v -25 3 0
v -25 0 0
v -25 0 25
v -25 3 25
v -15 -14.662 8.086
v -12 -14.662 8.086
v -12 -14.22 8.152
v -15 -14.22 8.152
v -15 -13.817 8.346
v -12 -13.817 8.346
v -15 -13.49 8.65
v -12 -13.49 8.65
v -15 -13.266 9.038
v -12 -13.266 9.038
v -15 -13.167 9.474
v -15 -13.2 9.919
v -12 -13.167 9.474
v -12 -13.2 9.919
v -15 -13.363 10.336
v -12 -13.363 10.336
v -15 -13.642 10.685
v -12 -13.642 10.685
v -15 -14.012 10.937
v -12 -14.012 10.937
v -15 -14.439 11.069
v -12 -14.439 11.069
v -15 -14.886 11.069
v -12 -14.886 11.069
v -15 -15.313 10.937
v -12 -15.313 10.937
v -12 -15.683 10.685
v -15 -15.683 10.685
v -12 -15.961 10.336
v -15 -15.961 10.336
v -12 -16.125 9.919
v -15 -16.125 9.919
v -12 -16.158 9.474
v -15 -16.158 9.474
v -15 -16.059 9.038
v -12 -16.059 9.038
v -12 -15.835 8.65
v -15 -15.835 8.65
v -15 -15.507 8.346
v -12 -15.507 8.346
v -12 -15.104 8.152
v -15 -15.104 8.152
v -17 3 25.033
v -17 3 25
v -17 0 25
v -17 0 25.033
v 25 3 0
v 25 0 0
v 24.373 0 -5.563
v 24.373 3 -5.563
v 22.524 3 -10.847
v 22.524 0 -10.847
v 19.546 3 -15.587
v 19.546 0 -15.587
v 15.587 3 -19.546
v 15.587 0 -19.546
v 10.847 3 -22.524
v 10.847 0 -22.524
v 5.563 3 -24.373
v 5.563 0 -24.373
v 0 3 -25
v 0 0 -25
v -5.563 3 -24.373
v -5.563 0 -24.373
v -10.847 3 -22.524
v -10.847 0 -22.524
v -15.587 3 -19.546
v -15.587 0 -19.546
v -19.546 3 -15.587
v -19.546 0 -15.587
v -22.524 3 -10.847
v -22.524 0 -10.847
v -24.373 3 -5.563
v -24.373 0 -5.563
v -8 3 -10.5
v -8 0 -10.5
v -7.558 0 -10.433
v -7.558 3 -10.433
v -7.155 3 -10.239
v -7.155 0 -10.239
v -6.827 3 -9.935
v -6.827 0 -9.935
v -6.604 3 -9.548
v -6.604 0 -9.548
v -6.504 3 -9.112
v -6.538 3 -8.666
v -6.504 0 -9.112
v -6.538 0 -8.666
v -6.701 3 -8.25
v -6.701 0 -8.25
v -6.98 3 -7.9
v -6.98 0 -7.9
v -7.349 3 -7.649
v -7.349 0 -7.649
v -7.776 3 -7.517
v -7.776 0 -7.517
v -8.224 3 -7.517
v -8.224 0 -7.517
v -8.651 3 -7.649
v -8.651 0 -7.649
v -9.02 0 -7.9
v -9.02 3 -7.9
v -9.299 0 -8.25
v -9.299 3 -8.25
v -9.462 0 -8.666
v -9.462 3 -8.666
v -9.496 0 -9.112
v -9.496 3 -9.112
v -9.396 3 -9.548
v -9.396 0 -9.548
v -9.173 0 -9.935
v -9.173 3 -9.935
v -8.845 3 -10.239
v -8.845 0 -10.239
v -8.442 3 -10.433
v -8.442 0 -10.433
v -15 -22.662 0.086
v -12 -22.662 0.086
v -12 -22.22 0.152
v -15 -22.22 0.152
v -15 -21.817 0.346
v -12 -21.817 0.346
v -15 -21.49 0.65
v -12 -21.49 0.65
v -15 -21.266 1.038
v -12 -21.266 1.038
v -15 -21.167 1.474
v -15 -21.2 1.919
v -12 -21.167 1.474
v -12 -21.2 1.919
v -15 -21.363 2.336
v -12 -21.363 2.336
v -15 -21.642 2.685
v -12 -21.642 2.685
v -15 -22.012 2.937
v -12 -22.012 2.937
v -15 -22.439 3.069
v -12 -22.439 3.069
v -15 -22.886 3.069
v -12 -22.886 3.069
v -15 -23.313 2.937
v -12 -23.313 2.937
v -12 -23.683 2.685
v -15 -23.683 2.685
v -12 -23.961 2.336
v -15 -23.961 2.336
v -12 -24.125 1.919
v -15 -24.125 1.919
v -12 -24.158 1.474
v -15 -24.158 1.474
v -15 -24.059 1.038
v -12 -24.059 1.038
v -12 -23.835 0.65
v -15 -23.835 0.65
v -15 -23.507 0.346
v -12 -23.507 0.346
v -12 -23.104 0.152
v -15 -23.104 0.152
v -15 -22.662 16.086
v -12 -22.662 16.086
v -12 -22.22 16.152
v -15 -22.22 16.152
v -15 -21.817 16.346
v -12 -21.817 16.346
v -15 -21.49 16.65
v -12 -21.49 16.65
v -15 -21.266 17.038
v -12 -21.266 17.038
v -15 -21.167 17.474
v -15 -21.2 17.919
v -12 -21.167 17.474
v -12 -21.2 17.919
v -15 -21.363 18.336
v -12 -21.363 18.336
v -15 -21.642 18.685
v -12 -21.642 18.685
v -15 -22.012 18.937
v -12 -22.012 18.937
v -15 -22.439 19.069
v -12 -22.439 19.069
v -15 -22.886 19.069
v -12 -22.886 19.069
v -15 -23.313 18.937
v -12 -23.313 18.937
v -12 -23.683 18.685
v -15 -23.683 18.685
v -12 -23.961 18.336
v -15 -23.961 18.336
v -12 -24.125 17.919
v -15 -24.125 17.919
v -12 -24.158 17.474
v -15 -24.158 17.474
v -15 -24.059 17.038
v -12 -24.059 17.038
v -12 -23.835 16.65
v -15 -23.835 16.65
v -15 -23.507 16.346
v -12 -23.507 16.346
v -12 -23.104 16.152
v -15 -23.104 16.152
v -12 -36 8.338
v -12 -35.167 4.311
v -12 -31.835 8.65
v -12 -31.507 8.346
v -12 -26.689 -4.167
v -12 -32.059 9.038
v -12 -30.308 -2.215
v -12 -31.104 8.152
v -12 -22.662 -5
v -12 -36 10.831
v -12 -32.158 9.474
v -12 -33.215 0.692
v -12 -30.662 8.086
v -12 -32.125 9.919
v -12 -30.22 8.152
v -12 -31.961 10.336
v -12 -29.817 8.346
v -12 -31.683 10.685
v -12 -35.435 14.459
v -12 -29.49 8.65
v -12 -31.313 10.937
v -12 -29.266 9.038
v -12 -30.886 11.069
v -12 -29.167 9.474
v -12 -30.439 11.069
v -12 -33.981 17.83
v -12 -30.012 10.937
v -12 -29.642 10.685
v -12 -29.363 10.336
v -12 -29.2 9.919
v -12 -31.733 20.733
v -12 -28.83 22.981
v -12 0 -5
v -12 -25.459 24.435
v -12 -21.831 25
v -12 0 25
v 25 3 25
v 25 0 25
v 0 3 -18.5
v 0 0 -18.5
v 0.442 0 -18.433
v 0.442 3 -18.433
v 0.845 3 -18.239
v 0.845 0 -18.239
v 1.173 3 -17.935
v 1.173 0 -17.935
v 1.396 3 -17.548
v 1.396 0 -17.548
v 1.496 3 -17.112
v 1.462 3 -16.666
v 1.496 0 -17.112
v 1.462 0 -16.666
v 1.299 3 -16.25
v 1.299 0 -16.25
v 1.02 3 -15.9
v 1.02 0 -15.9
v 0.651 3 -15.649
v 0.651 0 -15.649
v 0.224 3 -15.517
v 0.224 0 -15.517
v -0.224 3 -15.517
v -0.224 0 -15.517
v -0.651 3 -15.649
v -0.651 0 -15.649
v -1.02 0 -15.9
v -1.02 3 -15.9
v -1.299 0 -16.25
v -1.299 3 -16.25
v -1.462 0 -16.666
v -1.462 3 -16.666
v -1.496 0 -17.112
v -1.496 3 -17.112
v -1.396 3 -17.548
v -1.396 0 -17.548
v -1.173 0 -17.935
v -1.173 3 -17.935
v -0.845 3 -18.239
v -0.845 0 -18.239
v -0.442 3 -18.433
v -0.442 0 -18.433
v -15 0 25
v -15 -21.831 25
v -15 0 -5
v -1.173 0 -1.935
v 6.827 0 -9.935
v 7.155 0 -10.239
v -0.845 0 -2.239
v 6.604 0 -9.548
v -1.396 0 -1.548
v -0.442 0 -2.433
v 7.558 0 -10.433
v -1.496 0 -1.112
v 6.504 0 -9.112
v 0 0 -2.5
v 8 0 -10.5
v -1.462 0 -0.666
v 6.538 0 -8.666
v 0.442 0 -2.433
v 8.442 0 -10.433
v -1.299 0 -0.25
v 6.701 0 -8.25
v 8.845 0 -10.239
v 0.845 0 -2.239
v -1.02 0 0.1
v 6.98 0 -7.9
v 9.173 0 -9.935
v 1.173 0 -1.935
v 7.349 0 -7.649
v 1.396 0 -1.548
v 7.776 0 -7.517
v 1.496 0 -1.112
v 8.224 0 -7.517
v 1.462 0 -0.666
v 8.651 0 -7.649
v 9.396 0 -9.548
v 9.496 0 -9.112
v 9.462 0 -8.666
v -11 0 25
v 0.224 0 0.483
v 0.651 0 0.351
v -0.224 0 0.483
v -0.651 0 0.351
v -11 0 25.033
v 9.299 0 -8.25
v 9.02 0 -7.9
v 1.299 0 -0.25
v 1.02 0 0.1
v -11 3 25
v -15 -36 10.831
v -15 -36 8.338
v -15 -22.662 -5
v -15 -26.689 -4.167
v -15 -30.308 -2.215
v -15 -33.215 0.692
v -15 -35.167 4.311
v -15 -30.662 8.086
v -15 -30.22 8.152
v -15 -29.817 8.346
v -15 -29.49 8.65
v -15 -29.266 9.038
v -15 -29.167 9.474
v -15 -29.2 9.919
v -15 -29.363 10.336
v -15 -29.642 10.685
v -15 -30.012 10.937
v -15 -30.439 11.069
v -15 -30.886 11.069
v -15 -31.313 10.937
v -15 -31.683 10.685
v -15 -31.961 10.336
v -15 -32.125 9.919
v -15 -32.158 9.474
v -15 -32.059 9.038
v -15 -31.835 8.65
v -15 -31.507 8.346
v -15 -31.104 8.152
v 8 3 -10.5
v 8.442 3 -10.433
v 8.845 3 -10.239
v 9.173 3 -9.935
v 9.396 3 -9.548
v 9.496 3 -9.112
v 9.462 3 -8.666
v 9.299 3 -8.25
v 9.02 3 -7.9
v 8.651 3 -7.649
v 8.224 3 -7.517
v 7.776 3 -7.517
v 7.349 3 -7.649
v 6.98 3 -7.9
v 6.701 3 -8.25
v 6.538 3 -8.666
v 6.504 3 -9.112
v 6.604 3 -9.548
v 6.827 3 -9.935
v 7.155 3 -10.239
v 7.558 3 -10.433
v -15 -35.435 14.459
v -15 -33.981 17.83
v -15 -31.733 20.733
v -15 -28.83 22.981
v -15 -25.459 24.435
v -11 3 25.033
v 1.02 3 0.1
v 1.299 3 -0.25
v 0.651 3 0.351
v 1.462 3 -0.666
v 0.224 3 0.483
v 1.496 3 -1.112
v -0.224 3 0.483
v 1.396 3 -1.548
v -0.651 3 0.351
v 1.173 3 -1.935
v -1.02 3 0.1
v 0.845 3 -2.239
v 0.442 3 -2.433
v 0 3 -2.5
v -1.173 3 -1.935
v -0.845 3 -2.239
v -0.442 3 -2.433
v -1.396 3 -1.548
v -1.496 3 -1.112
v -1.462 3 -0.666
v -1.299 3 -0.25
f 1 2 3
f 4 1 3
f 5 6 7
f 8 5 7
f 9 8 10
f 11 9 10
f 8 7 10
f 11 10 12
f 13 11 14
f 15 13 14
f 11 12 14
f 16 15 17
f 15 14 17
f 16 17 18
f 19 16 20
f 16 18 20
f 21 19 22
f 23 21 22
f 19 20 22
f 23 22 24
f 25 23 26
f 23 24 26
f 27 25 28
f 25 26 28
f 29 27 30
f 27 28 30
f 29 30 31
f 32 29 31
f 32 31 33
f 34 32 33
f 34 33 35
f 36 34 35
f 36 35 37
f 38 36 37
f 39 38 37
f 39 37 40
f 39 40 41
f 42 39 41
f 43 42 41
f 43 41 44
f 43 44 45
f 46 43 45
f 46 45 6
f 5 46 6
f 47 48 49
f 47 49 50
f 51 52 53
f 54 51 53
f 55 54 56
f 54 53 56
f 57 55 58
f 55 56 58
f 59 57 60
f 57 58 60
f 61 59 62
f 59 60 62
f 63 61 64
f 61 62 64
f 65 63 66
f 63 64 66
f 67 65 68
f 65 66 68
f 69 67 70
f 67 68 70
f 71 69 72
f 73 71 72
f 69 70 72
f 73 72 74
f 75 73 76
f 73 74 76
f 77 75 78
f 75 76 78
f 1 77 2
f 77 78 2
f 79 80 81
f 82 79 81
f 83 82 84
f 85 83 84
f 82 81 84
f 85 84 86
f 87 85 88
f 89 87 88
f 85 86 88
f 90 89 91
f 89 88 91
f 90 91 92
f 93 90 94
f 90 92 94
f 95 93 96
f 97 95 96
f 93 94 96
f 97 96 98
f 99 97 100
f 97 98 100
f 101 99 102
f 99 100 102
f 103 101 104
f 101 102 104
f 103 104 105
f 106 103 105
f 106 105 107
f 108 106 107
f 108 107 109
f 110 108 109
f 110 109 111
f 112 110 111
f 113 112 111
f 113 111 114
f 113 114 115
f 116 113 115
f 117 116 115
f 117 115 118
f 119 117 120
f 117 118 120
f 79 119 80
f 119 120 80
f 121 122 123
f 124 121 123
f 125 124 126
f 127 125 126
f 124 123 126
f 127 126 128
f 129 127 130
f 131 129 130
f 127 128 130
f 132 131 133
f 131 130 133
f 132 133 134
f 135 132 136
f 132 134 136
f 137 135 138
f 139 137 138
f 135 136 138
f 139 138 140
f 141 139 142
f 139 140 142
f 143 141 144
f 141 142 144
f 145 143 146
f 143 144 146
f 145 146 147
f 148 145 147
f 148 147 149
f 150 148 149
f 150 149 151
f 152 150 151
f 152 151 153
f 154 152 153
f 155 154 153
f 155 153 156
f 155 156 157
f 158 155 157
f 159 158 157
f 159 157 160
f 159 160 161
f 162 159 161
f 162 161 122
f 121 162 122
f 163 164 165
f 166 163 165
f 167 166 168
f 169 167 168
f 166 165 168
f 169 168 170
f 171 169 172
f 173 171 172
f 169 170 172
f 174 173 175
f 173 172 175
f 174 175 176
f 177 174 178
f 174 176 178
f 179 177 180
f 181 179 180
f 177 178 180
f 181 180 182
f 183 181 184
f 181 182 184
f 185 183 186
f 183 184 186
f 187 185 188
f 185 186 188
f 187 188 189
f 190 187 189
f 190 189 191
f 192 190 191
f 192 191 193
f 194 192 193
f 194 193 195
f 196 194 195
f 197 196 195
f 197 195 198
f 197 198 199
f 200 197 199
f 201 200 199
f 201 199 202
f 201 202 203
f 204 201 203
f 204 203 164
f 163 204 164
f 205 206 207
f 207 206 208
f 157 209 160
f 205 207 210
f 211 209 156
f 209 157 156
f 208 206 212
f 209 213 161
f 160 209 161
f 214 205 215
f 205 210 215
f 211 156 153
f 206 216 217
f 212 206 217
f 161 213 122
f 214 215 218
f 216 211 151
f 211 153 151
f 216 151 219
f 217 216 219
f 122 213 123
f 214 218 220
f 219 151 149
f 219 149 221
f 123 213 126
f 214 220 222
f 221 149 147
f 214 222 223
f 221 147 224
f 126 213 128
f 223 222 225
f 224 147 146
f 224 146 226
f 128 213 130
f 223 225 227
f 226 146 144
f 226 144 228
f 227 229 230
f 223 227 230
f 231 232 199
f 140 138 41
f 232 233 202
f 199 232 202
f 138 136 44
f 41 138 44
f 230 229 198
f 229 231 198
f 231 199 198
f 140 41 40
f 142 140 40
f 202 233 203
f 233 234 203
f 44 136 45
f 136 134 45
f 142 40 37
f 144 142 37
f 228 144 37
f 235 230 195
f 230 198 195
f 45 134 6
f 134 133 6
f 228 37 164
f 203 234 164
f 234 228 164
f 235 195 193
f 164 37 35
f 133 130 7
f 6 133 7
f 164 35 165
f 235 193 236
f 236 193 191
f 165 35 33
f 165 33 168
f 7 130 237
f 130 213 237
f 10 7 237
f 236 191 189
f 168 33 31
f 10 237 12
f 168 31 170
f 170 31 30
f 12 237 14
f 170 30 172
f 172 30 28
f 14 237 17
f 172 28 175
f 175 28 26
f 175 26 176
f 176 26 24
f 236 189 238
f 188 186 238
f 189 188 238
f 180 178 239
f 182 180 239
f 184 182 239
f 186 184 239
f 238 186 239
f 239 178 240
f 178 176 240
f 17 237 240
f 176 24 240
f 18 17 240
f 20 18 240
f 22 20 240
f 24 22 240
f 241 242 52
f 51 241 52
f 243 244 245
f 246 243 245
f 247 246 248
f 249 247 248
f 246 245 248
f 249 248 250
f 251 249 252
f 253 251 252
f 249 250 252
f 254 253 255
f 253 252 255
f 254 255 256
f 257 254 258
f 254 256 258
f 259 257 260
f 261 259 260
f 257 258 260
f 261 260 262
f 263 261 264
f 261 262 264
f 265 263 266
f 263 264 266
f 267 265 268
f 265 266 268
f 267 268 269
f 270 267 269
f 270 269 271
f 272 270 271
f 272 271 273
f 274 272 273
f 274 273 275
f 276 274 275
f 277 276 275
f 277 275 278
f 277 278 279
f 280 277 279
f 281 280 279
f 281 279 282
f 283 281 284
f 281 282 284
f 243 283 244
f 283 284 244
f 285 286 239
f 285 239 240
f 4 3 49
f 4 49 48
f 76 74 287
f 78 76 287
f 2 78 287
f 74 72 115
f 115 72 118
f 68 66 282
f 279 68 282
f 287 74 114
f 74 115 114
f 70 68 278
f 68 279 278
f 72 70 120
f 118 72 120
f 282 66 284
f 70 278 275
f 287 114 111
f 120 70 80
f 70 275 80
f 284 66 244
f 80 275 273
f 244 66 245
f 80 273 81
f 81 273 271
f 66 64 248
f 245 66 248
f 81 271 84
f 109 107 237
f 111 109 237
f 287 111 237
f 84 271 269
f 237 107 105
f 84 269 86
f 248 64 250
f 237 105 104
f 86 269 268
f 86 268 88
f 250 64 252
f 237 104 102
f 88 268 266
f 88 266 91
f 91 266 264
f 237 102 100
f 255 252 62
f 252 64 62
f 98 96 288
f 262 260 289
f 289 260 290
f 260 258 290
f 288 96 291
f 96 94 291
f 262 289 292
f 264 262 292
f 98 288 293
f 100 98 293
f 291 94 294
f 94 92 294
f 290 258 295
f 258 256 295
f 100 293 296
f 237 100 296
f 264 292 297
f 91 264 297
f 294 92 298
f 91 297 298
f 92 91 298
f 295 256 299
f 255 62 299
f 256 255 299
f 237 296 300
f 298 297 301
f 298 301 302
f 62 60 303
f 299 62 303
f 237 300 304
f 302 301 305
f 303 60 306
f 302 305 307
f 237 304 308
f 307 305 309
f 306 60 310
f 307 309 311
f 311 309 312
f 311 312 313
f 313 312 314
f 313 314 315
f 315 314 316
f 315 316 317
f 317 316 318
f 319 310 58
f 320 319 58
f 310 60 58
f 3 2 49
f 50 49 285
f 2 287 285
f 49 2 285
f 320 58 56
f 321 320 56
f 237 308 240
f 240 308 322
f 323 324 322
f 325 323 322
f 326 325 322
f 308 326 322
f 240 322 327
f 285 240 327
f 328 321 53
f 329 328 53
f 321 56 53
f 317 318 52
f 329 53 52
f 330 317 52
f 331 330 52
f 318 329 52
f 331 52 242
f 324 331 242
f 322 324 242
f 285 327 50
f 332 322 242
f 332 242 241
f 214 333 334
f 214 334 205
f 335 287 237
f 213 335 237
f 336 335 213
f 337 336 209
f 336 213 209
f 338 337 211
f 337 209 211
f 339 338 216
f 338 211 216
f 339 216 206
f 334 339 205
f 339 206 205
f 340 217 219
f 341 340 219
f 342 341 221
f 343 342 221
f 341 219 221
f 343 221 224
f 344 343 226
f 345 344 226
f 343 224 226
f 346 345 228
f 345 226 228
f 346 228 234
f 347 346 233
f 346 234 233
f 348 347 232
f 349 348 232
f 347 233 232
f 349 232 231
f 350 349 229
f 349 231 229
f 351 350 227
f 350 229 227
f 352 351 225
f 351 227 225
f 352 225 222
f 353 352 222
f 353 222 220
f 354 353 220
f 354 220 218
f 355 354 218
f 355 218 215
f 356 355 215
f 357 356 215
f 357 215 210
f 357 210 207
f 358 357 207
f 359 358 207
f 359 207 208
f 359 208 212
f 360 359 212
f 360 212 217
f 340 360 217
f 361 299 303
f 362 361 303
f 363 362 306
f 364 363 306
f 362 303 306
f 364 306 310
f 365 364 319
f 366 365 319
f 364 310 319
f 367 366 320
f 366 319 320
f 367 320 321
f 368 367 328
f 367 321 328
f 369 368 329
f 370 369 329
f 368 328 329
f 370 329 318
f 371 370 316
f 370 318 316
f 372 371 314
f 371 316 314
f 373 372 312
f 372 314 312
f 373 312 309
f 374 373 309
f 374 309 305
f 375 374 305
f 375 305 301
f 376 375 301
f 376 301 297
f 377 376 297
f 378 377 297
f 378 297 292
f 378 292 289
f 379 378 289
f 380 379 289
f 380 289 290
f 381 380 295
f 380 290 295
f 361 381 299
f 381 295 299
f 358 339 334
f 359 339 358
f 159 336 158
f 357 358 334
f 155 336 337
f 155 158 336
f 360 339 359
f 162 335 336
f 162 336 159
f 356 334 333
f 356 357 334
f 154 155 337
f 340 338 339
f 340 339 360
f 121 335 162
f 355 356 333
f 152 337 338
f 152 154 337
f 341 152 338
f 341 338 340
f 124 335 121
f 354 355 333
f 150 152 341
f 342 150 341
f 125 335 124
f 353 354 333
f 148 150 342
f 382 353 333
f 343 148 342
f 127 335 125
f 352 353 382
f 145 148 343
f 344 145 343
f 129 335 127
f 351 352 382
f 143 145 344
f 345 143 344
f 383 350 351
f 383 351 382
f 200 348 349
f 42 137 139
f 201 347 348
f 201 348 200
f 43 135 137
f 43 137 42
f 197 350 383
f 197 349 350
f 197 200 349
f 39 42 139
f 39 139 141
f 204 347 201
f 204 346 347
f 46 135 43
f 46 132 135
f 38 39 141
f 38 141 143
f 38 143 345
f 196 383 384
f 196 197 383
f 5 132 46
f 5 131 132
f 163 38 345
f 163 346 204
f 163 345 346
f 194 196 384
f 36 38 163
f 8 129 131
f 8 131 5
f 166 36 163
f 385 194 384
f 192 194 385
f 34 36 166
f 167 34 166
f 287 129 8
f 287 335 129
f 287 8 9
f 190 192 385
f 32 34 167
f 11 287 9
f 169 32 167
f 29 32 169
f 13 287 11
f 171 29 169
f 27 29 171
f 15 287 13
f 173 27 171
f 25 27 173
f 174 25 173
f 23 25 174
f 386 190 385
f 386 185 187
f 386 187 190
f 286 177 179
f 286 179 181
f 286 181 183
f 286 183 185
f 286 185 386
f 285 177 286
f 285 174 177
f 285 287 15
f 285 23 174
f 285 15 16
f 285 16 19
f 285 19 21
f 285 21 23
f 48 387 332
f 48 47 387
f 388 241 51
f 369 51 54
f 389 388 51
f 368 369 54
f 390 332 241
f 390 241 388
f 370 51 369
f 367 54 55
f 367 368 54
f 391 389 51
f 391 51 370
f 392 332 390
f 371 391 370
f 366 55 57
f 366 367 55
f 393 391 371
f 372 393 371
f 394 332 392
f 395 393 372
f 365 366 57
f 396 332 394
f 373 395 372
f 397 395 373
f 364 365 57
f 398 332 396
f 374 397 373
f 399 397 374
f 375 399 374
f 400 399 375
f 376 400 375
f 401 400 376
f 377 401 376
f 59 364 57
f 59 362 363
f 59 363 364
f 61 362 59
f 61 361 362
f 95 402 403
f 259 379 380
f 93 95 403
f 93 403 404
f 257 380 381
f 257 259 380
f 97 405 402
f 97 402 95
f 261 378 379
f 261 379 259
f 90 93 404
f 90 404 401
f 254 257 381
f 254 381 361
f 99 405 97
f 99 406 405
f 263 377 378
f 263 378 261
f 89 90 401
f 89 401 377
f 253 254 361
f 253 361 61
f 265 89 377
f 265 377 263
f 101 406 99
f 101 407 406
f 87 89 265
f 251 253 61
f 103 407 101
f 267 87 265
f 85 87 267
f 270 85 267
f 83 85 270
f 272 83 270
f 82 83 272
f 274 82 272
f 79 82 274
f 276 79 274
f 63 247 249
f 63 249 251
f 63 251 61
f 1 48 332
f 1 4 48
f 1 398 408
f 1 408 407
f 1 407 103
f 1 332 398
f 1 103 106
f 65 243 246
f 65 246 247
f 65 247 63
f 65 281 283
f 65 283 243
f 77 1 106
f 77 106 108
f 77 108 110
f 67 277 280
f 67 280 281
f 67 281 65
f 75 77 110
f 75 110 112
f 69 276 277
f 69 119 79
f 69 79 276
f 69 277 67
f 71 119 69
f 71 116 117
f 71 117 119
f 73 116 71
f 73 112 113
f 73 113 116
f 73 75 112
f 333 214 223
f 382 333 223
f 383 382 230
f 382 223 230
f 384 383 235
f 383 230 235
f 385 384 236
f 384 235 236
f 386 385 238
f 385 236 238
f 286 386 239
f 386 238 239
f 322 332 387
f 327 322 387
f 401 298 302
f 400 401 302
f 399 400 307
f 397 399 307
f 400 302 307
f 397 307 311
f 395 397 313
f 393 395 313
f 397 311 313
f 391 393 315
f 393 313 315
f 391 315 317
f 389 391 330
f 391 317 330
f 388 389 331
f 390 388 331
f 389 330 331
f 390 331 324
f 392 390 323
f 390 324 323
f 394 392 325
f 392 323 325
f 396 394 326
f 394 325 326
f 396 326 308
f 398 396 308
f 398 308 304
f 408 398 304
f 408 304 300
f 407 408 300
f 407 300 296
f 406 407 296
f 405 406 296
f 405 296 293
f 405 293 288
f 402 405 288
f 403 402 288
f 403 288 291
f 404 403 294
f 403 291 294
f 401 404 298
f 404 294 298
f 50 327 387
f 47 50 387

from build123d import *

# Parameters (mm, degrees)
BOSS_EXTRU_1_DEPTH      = 3
ESQUISSE4_W             = 4
ESQUISSE4_H             = 25
ENL_V_MAT_EXTRU_1_DEPTH = 3
ESQUISSE5_R             = 1.5
ENL_V_MAT_EXTRU_2_DEPTH = 3
ESQUISSE9_W             = 25.088970056
ESQUISSE9_H             = 3
BOSS_EXTRU_5_DEPTH      = 6
ESQUISSE10_W            = 3
ESQUISSE10_H            = 30
BOSS_EXTRU_6_DEPTH      = 36
ESQUISSE12_R            = 1.5
ENL_V_MAT_EXTRU_3_DEPTH = 36
ESQUISSE8_W             = 25.033293463
ESQUISSE8_H             = 3
BOSS_EXTRU_4_DEPTH      = 6


with BuildPart() as part:
    # Esquisse2 → Boss.-Extru.1 (new body)
    with BuildSketch(Plane(origin=(0, 0, 0), x_dir=(1, 0, 0), z_dir=(0, 1, 0))):
        with BuildLine():
            Line((-25, 0), (-25, -25))
            Line((-25, -25), (25, -25))
            Line((25, -25), (25, 0))
            ThreePointArc((25, 0), (0, 25), (-25, 0))
        make_face()
    extrude(amount=BOSS_EXTRU_1_DEPTH)

    # Esquisse4 → Enlèv. mat.-Extru.1 (cut)
    with BuildSketch(Plane.XZ):
        with Locations((-13, 12.5)):
            Rectangle(ESQUISSE4_W, ESQUISSE4_H)
    extrude(amount=-ENL_V_MAT_EXTRU_1_DEPTH, mode=Mode.SUBTRACT)

    # Esquisse5 → Enlèv. mat.-Extru.2 (cut)
    with BuildSketch(Plane.XZ):
        with Locations(Location((8, -9, 0), (0, 0, 270))):
            Circle(ESQUISSE5_R)
        with Locations(Location((-8, -9, 0), (0, 0, 270))):
            Circle(ESQUISSE5_R)
        with Locations(Location((0, -17, 0), (0, 0, 270))):
            Circle(ESQUISSE5_R)
        with Locations(Location((0, -1, 0), (0, 0, 270))):
            Circle(ESQUISSE5_R)
    extrude(amount=-ENL_V_MAT_EXTRU_2_DEPTH, mode=Mode.SUBTRACT)

    # Esquisse9 → Boss.-Extru.5 (add)
    with BuildSketch(Plane(origin=(-15, 0, 0), x_dir=(0, 0, -1), z_dir=(1, 0, 0))):
        with Locations((-12.455514972, 1.5)):
            Rectangle(ESQUISSE9_W, ESQUISSE9_H)
    extrude(amount=BOSS_EXTRU_5_DEPTH)

    # Esquisse10 → Boss.-Extru.6 (add)
    with BuildSketch(Plane.XZ):
        with Locations((-13.5, 10)):
            Rectangle(ESQUISSE10_W, ESQUISSE10_H)
    extrude(amount=BOSS_EXTRU_6_DEPTH)

    # Esquisse12 → Enlèv. mat.-Extru.3 (cut)
    with BuildSketch(Plane(origin=(-12, 0, 0), x_dir=(0, 0, 1), z_dir=(1, 0, 0))):
        with BuildLine():
            Line((-5, 36), (-5, 22.662353219))
            ThreePointArc((-5, 22.662353219), (-0.867271737, 31.867271737), (8.337646782, 36))
            Line((8.337646782, 36), (-5, 36))
        make_face()
        with BuildLine():
            Line((25, 36), (10.831176607, 36))
            ThreePointArc((10.831176607, 36), (20.732510765, 31.732510766), (25, 21.831176609))
            Line((25, 21.831176609), (25, 36))
        make_face()
        with Locations(Location((9.585618663, 30.662353219, 0), (0, 0, 180))):
            Circle(ESQUISSE12_R)
        with Locations(Location((1.585618663, 22.662353219, 0), (0, 0, 180))):
            Circle(ESQUISSE12_R)
        with Locations(Location((9.585618663, 14.662353219, 0), (0, 0, 180))):
            Circle(ESQUISSE12_R)
        with Locations(Location((17.585618663, 22.662353219, 0), (0, 0, 180))):
            Circle(ESQUISSE12_R)
    extrude(amount=-ENL_V_MAT_EXTRU_3_DEPTH, mode=Mode.SUBTRACT)

    # Esquisse8 → Boss.-Extru.4 (add)
    with BuildSketch(Plane.ZY.offset(11)):
        with Locations((12.516646732, 1.5)):
            Rectangle(ESQUISSE8_W, ESQUISSE8_H)
    extrude(amount=BOSS_EXTRU_4_DEPTH)


solid = part.part
